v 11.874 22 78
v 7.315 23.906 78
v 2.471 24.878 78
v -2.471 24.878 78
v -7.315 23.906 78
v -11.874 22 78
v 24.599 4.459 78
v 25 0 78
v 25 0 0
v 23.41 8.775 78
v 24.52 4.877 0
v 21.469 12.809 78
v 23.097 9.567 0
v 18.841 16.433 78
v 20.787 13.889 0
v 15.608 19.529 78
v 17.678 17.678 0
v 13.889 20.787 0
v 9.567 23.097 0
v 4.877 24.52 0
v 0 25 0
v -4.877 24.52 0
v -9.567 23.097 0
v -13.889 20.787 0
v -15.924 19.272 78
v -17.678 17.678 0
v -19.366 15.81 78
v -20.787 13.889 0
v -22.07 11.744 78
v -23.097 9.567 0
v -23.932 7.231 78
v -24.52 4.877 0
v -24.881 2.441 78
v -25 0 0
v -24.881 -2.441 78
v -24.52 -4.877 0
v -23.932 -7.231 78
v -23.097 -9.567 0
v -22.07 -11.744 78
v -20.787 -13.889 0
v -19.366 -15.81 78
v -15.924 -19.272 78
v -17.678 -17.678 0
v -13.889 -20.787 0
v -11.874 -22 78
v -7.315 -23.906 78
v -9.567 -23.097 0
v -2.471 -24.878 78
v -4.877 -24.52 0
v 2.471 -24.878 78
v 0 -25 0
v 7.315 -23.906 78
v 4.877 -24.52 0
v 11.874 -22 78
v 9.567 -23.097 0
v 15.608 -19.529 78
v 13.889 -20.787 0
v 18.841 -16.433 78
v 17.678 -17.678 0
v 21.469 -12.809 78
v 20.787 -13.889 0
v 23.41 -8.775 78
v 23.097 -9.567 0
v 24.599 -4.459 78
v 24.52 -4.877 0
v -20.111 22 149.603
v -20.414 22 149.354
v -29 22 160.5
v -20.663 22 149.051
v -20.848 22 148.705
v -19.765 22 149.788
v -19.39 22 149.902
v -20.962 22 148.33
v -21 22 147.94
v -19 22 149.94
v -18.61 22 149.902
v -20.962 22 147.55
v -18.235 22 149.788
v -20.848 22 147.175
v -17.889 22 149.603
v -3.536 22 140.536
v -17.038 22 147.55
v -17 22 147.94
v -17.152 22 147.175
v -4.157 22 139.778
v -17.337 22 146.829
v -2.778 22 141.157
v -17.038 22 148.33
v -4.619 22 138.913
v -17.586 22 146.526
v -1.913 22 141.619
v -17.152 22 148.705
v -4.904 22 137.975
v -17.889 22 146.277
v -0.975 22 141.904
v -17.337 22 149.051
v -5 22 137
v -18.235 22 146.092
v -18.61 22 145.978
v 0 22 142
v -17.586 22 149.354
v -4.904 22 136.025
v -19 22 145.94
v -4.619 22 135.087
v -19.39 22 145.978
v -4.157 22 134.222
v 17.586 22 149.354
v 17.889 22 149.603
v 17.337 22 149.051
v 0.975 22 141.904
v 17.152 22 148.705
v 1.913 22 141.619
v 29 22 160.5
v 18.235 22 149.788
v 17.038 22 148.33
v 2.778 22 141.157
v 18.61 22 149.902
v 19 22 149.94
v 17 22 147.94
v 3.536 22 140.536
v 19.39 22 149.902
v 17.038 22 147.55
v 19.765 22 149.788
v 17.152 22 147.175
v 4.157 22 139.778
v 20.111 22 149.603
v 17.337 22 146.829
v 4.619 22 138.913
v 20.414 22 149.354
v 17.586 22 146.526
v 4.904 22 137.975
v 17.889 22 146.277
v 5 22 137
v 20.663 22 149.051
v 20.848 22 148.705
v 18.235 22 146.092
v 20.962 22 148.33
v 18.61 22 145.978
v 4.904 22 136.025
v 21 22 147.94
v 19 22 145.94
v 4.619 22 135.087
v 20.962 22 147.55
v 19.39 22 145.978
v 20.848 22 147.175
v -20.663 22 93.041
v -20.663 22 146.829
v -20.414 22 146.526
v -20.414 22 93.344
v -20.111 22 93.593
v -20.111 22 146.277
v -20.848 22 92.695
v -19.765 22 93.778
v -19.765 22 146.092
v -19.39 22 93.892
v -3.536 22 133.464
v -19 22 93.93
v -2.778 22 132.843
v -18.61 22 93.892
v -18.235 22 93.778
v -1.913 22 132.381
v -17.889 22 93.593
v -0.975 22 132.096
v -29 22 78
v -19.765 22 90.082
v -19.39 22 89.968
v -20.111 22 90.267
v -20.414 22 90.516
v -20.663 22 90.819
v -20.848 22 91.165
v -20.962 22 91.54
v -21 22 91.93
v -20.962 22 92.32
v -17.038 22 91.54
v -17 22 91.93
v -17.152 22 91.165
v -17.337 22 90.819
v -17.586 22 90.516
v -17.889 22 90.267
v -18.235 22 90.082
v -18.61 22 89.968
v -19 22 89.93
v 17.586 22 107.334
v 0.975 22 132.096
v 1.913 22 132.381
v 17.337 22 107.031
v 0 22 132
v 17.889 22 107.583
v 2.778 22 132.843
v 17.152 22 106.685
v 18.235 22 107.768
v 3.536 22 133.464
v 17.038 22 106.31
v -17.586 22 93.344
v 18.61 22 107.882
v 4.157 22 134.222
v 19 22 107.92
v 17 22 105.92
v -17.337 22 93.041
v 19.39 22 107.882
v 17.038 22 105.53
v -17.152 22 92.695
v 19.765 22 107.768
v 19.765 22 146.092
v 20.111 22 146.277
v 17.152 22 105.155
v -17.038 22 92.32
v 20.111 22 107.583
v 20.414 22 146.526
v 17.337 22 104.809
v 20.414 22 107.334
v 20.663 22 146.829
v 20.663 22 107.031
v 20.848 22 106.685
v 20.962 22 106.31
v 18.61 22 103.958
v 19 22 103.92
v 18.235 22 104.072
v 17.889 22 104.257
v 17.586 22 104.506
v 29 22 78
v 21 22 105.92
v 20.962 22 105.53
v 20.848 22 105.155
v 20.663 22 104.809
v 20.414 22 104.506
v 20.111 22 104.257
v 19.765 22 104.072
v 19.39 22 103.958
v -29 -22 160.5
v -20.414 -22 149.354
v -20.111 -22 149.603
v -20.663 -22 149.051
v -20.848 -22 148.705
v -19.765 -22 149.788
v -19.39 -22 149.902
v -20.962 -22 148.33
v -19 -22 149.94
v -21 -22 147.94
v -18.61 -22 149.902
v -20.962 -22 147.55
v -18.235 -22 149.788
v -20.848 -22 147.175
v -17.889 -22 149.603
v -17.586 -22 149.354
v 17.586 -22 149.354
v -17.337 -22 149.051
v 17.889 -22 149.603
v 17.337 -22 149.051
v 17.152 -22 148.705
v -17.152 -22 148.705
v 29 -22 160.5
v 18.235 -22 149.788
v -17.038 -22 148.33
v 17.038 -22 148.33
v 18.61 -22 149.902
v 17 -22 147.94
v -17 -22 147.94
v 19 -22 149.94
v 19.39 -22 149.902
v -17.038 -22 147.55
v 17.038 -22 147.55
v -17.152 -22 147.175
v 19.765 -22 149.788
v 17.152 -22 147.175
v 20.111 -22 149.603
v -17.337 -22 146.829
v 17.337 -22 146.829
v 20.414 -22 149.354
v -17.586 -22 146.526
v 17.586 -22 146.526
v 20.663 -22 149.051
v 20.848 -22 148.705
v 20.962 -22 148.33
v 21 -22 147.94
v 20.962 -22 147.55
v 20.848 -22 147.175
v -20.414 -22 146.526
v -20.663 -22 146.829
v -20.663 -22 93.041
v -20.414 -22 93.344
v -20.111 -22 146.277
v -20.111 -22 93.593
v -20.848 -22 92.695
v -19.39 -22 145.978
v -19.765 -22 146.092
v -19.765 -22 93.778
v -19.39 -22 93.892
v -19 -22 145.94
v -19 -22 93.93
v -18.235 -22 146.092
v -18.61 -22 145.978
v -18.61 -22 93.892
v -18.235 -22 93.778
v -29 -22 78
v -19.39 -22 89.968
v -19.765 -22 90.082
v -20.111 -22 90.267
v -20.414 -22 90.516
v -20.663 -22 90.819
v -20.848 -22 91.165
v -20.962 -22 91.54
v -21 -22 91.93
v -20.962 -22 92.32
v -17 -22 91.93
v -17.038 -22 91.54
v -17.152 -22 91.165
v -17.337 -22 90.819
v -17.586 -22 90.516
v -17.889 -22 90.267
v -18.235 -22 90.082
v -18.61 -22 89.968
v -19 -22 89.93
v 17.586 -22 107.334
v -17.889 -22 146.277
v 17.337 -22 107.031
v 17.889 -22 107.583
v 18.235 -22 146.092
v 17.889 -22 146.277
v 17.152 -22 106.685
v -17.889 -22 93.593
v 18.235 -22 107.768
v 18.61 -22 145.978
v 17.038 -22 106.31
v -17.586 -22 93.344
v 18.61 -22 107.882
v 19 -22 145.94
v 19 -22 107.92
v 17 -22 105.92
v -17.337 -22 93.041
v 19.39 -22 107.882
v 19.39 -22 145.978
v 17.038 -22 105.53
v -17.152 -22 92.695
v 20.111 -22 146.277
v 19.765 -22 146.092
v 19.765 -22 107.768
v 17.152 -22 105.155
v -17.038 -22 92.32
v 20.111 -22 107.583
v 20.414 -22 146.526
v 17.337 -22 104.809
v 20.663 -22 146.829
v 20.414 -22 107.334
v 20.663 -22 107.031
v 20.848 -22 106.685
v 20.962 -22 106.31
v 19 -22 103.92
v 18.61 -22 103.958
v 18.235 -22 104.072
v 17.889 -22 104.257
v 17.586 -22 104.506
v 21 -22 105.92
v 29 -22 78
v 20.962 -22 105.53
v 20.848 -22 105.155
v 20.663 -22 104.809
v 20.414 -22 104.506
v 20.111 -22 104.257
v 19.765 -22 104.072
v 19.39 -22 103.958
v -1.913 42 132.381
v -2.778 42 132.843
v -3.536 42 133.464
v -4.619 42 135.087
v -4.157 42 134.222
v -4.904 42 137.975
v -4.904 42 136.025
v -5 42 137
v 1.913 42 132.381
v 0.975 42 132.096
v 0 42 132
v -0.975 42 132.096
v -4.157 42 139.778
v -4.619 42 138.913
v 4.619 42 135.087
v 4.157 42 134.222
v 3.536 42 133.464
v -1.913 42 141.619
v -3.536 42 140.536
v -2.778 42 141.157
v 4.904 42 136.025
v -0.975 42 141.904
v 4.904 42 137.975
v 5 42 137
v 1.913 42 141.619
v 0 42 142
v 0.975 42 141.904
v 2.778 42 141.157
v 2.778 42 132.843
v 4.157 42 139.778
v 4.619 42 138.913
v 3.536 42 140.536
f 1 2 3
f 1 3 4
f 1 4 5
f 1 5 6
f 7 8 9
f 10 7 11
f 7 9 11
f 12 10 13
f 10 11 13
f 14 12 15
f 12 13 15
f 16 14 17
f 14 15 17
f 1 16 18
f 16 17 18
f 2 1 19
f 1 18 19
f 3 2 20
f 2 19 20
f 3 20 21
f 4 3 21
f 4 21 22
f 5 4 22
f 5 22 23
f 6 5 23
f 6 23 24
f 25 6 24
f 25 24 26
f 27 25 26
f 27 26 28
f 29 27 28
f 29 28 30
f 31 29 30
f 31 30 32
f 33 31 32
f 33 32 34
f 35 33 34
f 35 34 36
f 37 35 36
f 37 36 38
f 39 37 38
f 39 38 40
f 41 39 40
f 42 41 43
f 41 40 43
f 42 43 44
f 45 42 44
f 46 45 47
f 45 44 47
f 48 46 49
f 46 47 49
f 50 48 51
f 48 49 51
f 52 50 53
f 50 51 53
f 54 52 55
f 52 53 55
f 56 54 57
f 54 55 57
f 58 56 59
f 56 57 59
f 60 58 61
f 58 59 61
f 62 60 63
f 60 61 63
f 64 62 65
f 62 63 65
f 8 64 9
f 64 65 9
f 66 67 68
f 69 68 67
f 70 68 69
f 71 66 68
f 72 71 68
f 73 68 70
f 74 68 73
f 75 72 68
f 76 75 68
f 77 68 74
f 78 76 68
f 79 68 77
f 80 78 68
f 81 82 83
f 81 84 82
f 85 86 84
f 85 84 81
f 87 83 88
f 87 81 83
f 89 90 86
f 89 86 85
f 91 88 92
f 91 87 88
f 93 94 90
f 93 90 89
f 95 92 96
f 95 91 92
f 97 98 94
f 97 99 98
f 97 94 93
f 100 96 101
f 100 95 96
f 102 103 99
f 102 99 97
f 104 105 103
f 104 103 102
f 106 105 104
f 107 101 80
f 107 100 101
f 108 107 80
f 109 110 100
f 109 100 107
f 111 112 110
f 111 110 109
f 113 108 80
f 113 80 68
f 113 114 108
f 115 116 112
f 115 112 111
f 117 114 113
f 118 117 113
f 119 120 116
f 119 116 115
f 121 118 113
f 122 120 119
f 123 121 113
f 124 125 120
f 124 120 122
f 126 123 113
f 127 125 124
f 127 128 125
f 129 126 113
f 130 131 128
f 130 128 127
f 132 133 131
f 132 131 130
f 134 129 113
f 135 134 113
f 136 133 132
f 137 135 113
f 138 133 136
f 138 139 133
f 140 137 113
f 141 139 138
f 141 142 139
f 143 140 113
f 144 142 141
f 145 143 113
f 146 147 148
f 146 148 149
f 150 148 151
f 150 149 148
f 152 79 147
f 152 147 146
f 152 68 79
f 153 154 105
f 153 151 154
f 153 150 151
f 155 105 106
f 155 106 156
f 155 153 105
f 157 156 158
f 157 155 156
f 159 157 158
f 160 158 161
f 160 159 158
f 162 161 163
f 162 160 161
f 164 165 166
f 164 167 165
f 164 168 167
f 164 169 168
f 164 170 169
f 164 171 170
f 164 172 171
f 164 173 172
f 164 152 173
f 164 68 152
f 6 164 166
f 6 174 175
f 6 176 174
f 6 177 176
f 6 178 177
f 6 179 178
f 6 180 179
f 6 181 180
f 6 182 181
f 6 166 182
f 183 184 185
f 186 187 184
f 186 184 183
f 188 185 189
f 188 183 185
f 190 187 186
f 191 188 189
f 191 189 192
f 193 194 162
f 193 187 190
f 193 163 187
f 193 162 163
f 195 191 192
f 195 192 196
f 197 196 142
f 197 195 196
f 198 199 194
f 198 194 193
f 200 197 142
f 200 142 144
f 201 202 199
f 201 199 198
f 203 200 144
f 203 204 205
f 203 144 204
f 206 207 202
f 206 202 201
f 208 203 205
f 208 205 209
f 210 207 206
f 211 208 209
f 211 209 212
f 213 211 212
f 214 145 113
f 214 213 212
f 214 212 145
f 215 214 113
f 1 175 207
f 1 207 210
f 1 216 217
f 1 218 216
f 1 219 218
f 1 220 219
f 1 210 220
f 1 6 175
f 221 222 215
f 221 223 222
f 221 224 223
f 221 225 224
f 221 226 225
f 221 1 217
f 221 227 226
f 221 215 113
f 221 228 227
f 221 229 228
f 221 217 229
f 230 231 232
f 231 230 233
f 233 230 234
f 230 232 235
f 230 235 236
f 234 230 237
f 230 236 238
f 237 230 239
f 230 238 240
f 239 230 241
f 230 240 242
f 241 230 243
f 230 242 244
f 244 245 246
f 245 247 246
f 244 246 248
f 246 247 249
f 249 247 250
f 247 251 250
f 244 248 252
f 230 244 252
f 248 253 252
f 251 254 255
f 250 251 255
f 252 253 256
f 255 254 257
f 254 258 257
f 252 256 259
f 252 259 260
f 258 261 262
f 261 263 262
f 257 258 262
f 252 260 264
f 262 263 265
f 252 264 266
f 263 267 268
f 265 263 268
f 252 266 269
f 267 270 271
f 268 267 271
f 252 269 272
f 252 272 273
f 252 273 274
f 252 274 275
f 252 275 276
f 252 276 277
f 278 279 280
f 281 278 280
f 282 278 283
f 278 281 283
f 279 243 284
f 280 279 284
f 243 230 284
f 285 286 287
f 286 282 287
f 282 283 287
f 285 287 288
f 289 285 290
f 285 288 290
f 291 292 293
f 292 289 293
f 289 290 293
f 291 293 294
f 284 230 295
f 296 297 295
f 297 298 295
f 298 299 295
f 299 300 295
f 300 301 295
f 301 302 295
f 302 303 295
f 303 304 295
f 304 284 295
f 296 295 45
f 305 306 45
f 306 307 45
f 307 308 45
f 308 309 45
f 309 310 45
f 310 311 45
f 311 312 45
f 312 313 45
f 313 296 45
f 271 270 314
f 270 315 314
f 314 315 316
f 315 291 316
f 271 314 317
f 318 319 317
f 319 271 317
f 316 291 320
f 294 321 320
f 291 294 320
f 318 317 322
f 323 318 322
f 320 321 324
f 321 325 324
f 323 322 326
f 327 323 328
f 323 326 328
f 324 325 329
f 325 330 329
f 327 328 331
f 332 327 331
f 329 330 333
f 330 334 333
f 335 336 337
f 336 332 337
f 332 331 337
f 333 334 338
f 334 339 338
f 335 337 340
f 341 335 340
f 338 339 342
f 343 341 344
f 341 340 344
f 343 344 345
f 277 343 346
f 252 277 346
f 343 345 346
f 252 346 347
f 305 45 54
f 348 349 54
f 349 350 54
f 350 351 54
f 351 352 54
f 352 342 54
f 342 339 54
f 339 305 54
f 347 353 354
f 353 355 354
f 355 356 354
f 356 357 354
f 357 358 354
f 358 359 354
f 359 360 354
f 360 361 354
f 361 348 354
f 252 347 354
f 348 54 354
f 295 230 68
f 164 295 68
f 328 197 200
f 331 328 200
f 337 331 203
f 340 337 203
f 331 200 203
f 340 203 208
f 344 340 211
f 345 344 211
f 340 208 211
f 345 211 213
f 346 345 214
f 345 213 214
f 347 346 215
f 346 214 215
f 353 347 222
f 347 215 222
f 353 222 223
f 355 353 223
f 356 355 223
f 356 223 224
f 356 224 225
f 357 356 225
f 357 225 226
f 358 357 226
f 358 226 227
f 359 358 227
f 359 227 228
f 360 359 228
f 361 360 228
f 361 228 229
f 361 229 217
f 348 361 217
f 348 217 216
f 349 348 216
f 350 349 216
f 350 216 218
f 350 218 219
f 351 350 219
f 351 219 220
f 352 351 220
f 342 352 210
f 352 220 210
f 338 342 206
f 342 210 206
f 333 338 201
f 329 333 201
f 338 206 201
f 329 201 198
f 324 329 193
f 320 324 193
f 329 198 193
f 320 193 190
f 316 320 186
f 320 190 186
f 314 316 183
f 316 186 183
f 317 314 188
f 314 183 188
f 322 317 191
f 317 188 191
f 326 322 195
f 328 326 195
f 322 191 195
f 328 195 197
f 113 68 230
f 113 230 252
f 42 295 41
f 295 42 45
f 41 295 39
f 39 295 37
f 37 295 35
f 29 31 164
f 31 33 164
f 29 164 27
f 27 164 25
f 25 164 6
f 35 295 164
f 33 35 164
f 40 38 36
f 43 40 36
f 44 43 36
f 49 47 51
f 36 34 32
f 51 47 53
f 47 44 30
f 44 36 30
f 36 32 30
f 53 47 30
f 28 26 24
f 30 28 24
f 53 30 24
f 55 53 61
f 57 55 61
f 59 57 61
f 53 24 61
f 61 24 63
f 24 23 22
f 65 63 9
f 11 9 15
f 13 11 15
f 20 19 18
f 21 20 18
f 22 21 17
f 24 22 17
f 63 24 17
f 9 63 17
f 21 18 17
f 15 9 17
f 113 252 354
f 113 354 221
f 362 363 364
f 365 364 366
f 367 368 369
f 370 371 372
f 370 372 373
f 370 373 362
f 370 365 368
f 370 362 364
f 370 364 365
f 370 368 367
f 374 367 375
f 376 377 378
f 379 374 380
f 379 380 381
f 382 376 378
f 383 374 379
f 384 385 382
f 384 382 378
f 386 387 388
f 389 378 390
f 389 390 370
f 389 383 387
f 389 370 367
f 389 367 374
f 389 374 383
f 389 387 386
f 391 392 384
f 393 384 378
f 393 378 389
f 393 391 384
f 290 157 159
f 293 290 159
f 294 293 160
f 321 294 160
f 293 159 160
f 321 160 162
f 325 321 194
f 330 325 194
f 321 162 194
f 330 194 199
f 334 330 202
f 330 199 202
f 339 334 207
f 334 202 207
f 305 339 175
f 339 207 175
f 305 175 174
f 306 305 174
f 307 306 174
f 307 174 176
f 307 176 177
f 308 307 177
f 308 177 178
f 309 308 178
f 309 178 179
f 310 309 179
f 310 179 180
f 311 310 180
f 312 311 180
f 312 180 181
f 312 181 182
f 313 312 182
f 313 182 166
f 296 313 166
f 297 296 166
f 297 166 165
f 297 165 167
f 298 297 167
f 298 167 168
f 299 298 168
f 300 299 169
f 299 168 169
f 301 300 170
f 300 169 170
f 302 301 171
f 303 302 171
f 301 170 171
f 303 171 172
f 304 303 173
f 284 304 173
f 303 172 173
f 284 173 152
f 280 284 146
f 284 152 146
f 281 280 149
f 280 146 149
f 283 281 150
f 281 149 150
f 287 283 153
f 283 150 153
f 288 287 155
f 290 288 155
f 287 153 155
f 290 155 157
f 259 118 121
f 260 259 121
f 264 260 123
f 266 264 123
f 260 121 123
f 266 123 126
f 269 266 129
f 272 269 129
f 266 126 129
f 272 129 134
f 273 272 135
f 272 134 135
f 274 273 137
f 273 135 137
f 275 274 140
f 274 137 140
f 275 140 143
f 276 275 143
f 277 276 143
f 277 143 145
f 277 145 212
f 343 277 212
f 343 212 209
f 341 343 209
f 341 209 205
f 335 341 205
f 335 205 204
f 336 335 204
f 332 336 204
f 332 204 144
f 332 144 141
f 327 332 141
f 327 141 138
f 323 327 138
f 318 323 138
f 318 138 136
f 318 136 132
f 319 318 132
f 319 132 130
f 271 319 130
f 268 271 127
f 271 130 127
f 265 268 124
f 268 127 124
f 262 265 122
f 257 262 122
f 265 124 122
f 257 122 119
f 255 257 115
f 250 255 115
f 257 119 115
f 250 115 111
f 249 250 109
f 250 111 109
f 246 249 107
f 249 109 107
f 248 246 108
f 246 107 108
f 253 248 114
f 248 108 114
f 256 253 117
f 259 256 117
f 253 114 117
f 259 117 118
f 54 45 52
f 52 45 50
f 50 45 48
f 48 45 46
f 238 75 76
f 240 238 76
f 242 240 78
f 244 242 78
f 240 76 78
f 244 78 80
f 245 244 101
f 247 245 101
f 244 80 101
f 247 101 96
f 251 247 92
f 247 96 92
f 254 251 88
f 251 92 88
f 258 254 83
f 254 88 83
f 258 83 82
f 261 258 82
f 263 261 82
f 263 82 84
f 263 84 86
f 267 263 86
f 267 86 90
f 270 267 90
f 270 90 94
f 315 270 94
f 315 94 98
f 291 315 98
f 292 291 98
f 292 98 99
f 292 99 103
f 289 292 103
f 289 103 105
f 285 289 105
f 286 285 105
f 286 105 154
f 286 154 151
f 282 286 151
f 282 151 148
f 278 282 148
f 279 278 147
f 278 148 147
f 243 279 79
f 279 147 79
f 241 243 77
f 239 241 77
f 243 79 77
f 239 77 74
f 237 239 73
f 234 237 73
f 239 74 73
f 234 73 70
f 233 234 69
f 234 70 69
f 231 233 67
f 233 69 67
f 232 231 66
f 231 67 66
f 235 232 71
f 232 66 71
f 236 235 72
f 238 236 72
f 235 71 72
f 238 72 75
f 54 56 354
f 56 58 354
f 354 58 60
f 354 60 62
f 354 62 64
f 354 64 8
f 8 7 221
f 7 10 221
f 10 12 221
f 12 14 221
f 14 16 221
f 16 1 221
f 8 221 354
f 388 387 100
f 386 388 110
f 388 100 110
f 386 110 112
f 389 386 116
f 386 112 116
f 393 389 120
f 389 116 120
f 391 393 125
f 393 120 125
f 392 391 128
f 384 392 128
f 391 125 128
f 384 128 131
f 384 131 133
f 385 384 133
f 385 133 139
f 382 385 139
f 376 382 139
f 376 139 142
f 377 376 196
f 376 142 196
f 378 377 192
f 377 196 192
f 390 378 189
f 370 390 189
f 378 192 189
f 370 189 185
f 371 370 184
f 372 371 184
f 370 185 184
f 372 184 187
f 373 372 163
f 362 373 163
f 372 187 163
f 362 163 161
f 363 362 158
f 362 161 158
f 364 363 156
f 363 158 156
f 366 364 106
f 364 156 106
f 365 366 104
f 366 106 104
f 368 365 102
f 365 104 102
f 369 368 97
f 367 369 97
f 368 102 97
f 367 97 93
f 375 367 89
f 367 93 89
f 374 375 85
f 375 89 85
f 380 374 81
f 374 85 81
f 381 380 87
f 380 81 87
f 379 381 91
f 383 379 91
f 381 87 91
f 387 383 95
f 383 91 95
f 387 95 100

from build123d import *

# Parameters (mm, degrees)
SKETCH1_R           = 25
BOSS_EXTRUDE1_DEPTH = 78
SKETCH2_W           = 58
SKETCH2_H           = 44
BOSS_EXTRUDE2_DEPTH = 82.5
SKETCH3_R           = 5
BOSS_EXTRUDE3_DEPTH = 20
SKETCH4_R           = 2
CUT_EXTRUDE1_DEPTH  = 170.73582415


with BuildPart() as part:
    # Sketch1 → Boss-Extrude1 (new body)
    with BuildSketch(Plane.XY):
        Circle(SKETCH1_R)
    extrude(amount=BOSS_EXTRUDE1_DEPTH)

    # Sketch2 → Boss-Extrude2 (add)
    with BuildSketch(Plane.XY.offset(78)):
        Rectangle(SKETCH2_W, SKETCH2_H)
    extrude(amount=BOSS_EXTRUDE2_DEPTH)

    # Sketch3 → Boss-Extrude3 (add)
    with BuildSketch(Plane(origin=(0, 22, 0), x_dir=(1, 0, 0), z_dir=(0, 1, 0))):
        with Locations(Location((0, -137, 0), (0, 0, 270))):
            Circle(SKETCH3_R)
    extrude(amount=BOSS_EXTRUDE3_DEPTH)

    # Sketch4 → Cut-Extrude1 (cut, through all)
    with BuildSketch(Plane(origin=(0, 22, 0), x_dir=(1, 0, 0), z_dir=(0, 1, 0))):
        with Locations(Location((19, -147.94, 0), (0, 0, 270))):
            Circle(SKETCH4_R)
        with Locations(Location((19, -105.92, 0), (0, 0, 270))):
            Circle(SKETCH4_R)
        with Locations(Location((-19, -147.94, 0), (0, 0, 270))):
            Circle(SKETCH4_R)
        with Locations(Location((-19, -91.93, 0), (0, 0, 270))):
            Circle(SKETCH4_R)
    extrude(amount=-CUT_EXTRUDE1_DEPTH, mode=Mode.SUBTRACT)


solid = part.part
